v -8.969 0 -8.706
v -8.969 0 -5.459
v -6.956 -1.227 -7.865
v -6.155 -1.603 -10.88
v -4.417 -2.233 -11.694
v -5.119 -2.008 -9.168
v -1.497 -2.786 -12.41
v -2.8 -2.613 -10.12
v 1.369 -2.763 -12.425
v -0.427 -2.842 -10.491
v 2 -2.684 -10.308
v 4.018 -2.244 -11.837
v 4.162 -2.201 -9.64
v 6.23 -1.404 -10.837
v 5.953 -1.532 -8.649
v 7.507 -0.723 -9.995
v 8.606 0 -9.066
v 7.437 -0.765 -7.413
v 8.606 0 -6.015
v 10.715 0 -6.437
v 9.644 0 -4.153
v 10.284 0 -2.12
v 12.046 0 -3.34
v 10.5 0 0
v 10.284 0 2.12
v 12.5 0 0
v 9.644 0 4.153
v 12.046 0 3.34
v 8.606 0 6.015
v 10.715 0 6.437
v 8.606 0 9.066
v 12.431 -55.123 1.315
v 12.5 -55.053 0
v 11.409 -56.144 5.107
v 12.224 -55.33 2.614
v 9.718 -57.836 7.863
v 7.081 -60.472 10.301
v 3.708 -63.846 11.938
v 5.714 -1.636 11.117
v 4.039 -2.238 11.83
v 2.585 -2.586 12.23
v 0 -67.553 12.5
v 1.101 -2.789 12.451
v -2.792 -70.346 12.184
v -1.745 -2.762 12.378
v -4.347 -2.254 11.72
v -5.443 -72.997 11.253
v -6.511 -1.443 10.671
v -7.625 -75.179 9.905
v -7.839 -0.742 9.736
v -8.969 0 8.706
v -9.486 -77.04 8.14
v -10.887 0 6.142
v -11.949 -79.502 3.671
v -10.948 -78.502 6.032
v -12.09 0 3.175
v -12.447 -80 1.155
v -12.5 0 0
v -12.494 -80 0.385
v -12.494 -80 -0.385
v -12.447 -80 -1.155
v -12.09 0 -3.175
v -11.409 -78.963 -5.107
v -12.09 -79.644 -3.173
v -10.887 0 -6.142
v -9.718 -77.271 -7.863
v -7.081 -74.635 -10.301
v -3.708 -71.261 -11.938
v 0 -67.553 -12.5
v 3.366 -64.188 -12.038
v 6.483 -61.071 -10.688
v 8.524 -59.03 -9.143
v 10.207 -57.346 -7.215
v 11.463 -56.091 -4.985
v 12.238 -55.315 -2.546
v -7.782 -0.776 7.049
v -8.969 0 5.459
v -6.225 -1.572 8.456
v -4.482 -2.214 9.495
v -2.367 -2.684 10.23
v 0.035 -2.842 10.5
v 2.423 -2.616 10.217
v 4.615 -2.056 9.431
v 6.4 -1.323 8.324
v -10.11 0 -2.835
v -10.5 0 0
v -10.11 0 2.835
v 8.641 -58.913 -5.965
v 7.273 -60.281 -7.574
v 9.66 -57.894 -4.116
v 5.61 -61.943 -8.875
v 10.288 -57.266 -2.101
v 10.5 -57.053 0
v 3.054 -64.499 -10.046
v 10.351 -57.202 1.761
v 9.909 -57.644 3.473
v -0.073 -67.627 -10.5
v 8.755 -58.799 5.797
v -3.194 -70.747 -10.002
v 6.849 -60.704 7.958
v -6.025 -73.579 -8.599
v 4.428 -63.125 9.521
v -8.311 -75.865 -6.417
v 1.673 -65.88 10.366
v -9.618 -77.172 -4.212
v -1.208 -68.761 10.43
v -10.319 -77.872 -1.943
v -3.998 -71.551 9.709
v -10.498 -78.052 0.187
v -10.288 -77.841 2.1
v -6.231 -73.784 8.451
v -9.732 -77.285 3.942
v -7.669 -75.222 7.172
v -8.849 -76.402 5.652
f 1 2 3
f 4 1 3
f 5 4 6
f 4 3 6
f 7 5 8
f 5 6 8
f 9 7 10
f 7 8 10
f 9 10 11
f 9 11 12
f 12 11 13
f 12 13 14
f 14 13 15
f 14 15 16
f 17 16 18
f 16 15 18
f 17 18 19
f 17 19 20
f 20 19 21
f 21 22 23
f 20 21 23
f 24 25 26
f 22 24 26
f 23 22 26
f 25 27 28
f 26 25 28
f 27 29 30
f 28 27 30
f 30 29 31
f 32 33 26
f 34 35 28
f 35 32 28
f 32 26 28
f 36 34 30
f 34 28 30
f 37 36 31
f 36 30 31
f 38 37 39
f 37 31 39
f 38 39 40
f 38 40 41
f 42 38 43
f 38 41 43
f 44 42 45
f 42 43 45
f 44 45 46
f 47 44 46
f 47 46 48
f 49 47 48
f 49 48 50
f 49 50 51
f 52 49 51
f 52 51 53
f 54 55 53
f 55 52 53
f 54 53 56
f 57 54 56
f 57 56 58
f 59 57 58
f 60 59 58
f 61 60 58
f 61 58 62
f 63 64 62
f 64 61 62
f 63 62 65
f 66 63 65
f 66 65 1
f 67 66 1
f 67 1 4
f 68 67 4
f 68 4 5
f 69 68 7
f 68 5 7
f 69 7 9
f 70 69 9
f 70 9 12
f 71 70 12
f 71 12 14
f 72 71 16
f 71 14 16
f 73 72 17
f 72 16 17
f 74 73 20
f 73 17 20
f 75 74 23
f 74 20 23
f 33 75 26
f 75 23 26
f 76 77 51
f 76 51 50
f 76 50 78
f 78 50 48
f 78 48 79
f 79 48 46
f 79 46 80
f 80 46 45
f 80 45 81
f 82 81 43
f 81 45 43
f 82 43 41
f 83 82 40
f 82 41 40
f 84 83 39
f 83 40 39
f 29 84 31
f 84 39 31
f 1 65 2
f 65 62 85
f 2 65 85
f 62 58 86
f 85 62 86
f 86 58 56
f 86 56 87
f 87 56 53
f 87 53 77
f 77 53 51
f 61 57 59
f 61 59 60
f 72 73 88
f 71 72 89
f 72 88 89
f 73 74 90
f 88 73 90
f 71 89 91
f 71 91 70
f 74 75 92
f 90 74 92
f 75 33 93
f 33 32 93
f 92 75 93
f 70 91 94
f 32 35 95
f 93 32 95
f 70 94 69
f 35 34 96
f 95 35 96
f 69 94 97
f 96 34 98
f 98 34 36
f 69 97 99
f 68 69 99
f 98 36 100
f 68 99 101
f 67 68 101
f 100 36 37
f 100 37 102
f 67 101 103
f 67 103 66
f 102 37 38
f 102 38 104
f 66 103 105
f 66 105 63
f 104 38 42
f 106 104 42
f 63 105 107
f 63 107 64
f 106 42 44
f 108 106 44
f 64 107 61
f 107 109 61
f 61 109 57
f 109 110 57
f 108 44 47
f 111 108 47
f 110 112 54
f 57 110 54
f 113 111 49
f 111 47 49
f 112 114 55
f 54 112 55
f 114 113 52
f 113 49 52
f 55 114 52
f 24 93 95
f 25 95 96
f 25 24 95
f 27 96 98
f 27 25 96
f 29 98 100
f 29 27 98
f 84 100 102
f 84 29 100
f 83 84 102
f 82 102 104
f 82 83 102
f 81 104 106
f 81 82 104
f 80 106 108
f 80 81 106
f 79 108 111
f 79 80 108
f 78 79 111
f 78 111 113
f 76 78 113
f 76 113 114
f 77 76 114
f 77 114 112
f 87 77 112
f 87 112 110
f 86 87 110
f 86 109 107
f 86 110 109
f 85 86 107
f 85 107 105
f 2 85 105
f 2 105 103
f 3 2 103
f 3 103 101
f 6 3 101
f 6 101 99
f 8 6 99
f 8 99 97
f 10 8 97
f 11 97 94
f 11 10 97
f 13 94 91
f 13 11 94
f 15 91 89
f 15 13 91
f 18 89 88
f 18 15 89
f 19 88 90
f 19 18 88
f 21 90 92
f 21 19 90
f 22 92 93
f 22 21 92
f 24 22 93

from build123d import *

# Parameters (mm, degrees)
F0_R     = 12.5
F0_R_2   = 10.5
F1_DEPTH = 80
F3_DEPTH = 12.5
F5_DEPTH = 25


with BuildPart() as f1:
    # F0 (on Front) → F1 (new body)
    with BuildSketch(Plane.XZ):
        Circle(F0_R)
        Circle(F0_R_2, mode=Mode.SUBTRACT)
    extrude(amount=F1_DEPTH)

    # F2 (on Top) → F3 (cut, symmetric)
    with BuildSketch(Plane.XY):
        Polygon((12.505536, -55.04792), (-12.494464, -80.04792), (12.505536, -80.04792), align=None)
    extrude(amount=F3_DEPTH, both=True, mode=Mode.SUBTRACT)

    # F4 (on Top) → F5 (cut, symmetric)
    with BuildSketch(Plane.XY):
        with BuildLine():
            Line((8.606103, 0), (-8.96935, 0))
            ThreePointArc((-8.96935, 0), (-0.181624, -2.84369), (8.606103, 0))
        make_face()
    extrude(amount=F5_DEPTH, both=True, mode=Mode.SUBTRACT)


solid = f1.part
